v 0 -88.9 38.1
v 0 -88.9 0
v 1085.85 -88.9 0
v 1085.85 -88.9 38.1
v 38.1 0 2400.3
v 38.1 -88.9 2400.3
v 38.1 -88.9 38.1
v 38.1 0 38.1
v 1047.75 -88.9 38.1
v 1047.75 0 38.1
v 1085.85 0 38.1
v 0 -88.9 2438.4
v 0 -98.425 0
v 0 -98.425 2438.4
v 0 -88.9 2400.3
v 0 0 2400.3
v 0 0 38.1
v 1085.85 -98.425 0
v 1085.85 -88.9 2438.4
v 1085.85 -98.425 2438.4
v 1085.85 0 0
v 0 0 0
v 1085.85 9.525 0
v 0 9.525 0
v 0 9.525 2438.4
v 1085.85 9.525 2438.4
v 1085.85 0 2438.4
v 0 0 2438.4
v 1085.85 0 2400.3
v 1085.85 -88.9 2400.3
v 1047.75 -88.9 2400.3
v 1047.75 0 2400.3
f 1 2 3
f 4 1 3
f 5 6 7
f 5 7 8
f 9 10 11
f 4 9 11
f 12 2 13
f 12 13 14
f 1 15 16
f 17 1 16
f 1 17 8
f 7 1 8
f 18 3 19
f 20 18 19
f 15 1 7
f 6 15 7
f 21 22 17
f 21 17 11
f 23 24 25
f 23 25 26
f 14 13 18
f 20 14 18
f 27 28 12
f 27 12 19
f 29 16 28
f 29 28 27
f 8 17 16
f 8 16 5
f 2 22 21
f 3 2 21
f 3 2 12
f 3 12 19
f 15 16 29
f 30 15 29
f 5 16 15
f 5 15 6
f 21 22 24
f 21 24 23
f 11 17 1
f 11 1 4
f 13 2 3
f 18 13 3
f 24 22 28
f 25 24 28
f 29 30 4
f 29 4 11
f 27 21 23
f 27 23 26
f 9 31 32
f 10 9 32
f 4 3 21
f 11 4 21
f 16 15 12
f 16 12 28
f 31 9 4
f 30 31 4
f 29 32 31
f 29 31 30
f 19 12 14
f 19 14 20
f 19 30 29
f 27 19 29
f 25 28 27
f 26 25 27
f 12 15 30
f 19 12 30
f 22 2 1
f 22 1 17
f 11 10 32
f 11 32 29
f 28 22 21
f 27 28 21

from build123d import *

# Parameters (mm, degrees)
F0_W     = 1085.85
F0_H     = 88.9
F1_DEPTH = 38.1
F2_W     = 38.1
F2_H     = 88.9
F3_DEPTH = 2362.2
F4_W     = 1085.85
F4_H     = 88.9
F5_DEPTH = 38.1
F6_W     = 1085.85
F6_H     = 2438.4
F7_DEPTH = 9.525


with BuildPart() as f1:
    # F0 (on Top) → F1 (new body)
    with BuildSketch(Plane.XY):
        with Locations((542.925, -44.45)):
            Rectangle(F0_W, F0_H)
    extrude(amount=F1_DEPTH)


with BuildPart() as f3:
    # F2 (on face) → F3 (new body)
    with BuildSketch(Plane.XY.offset(38.1)):
        with Locations((19.05, -44.45)):
            Rectangle(F2_W, F2_H)
    extrude(amount=F3_DEPTH)


with BuildPart() as f3b:
    # F2 (on face) → F3, piece 2 (new body)
    with BuildSketch(Plane.XY.offset(38.1)):
        with Locations((1066.8, -44.45)):
            Rectangle(F2_W, F2_H)
    extrude(amount=F3_DEPTH)


with BuildPart() as f5:
    # F4 (on face) → F5 (new body)
    with BuildSketch(Plane.XY.offset(2400.3)):
        with Locations((542.925, -44.45)):
            Rectangle(F4_W, F4_H)
    extrude(amount=F5_DEPTH)


with BuildPart() as f7:
    # F6 (on face) → F7 (new body)
    with BuildSketch(Plane.XZ.offset(88.9)):
        with Locations((542.925, 1219.2)):
            Rectangle(F6_W, F6_H)
    extrude(amount=F7_DEPTH)


with BuildPart() as f12_1:
    # F12: instance of F7
    add(f7.part.mirror(Plane(origin=(1085.85, -44.45, 2438.4), x_dir=(0, 0, -1), z_dir=(0, -1, 0))))


solid = Compound([f1.part, f3.part, f3b.part, f5.part, f7.part, f12_1.part])
